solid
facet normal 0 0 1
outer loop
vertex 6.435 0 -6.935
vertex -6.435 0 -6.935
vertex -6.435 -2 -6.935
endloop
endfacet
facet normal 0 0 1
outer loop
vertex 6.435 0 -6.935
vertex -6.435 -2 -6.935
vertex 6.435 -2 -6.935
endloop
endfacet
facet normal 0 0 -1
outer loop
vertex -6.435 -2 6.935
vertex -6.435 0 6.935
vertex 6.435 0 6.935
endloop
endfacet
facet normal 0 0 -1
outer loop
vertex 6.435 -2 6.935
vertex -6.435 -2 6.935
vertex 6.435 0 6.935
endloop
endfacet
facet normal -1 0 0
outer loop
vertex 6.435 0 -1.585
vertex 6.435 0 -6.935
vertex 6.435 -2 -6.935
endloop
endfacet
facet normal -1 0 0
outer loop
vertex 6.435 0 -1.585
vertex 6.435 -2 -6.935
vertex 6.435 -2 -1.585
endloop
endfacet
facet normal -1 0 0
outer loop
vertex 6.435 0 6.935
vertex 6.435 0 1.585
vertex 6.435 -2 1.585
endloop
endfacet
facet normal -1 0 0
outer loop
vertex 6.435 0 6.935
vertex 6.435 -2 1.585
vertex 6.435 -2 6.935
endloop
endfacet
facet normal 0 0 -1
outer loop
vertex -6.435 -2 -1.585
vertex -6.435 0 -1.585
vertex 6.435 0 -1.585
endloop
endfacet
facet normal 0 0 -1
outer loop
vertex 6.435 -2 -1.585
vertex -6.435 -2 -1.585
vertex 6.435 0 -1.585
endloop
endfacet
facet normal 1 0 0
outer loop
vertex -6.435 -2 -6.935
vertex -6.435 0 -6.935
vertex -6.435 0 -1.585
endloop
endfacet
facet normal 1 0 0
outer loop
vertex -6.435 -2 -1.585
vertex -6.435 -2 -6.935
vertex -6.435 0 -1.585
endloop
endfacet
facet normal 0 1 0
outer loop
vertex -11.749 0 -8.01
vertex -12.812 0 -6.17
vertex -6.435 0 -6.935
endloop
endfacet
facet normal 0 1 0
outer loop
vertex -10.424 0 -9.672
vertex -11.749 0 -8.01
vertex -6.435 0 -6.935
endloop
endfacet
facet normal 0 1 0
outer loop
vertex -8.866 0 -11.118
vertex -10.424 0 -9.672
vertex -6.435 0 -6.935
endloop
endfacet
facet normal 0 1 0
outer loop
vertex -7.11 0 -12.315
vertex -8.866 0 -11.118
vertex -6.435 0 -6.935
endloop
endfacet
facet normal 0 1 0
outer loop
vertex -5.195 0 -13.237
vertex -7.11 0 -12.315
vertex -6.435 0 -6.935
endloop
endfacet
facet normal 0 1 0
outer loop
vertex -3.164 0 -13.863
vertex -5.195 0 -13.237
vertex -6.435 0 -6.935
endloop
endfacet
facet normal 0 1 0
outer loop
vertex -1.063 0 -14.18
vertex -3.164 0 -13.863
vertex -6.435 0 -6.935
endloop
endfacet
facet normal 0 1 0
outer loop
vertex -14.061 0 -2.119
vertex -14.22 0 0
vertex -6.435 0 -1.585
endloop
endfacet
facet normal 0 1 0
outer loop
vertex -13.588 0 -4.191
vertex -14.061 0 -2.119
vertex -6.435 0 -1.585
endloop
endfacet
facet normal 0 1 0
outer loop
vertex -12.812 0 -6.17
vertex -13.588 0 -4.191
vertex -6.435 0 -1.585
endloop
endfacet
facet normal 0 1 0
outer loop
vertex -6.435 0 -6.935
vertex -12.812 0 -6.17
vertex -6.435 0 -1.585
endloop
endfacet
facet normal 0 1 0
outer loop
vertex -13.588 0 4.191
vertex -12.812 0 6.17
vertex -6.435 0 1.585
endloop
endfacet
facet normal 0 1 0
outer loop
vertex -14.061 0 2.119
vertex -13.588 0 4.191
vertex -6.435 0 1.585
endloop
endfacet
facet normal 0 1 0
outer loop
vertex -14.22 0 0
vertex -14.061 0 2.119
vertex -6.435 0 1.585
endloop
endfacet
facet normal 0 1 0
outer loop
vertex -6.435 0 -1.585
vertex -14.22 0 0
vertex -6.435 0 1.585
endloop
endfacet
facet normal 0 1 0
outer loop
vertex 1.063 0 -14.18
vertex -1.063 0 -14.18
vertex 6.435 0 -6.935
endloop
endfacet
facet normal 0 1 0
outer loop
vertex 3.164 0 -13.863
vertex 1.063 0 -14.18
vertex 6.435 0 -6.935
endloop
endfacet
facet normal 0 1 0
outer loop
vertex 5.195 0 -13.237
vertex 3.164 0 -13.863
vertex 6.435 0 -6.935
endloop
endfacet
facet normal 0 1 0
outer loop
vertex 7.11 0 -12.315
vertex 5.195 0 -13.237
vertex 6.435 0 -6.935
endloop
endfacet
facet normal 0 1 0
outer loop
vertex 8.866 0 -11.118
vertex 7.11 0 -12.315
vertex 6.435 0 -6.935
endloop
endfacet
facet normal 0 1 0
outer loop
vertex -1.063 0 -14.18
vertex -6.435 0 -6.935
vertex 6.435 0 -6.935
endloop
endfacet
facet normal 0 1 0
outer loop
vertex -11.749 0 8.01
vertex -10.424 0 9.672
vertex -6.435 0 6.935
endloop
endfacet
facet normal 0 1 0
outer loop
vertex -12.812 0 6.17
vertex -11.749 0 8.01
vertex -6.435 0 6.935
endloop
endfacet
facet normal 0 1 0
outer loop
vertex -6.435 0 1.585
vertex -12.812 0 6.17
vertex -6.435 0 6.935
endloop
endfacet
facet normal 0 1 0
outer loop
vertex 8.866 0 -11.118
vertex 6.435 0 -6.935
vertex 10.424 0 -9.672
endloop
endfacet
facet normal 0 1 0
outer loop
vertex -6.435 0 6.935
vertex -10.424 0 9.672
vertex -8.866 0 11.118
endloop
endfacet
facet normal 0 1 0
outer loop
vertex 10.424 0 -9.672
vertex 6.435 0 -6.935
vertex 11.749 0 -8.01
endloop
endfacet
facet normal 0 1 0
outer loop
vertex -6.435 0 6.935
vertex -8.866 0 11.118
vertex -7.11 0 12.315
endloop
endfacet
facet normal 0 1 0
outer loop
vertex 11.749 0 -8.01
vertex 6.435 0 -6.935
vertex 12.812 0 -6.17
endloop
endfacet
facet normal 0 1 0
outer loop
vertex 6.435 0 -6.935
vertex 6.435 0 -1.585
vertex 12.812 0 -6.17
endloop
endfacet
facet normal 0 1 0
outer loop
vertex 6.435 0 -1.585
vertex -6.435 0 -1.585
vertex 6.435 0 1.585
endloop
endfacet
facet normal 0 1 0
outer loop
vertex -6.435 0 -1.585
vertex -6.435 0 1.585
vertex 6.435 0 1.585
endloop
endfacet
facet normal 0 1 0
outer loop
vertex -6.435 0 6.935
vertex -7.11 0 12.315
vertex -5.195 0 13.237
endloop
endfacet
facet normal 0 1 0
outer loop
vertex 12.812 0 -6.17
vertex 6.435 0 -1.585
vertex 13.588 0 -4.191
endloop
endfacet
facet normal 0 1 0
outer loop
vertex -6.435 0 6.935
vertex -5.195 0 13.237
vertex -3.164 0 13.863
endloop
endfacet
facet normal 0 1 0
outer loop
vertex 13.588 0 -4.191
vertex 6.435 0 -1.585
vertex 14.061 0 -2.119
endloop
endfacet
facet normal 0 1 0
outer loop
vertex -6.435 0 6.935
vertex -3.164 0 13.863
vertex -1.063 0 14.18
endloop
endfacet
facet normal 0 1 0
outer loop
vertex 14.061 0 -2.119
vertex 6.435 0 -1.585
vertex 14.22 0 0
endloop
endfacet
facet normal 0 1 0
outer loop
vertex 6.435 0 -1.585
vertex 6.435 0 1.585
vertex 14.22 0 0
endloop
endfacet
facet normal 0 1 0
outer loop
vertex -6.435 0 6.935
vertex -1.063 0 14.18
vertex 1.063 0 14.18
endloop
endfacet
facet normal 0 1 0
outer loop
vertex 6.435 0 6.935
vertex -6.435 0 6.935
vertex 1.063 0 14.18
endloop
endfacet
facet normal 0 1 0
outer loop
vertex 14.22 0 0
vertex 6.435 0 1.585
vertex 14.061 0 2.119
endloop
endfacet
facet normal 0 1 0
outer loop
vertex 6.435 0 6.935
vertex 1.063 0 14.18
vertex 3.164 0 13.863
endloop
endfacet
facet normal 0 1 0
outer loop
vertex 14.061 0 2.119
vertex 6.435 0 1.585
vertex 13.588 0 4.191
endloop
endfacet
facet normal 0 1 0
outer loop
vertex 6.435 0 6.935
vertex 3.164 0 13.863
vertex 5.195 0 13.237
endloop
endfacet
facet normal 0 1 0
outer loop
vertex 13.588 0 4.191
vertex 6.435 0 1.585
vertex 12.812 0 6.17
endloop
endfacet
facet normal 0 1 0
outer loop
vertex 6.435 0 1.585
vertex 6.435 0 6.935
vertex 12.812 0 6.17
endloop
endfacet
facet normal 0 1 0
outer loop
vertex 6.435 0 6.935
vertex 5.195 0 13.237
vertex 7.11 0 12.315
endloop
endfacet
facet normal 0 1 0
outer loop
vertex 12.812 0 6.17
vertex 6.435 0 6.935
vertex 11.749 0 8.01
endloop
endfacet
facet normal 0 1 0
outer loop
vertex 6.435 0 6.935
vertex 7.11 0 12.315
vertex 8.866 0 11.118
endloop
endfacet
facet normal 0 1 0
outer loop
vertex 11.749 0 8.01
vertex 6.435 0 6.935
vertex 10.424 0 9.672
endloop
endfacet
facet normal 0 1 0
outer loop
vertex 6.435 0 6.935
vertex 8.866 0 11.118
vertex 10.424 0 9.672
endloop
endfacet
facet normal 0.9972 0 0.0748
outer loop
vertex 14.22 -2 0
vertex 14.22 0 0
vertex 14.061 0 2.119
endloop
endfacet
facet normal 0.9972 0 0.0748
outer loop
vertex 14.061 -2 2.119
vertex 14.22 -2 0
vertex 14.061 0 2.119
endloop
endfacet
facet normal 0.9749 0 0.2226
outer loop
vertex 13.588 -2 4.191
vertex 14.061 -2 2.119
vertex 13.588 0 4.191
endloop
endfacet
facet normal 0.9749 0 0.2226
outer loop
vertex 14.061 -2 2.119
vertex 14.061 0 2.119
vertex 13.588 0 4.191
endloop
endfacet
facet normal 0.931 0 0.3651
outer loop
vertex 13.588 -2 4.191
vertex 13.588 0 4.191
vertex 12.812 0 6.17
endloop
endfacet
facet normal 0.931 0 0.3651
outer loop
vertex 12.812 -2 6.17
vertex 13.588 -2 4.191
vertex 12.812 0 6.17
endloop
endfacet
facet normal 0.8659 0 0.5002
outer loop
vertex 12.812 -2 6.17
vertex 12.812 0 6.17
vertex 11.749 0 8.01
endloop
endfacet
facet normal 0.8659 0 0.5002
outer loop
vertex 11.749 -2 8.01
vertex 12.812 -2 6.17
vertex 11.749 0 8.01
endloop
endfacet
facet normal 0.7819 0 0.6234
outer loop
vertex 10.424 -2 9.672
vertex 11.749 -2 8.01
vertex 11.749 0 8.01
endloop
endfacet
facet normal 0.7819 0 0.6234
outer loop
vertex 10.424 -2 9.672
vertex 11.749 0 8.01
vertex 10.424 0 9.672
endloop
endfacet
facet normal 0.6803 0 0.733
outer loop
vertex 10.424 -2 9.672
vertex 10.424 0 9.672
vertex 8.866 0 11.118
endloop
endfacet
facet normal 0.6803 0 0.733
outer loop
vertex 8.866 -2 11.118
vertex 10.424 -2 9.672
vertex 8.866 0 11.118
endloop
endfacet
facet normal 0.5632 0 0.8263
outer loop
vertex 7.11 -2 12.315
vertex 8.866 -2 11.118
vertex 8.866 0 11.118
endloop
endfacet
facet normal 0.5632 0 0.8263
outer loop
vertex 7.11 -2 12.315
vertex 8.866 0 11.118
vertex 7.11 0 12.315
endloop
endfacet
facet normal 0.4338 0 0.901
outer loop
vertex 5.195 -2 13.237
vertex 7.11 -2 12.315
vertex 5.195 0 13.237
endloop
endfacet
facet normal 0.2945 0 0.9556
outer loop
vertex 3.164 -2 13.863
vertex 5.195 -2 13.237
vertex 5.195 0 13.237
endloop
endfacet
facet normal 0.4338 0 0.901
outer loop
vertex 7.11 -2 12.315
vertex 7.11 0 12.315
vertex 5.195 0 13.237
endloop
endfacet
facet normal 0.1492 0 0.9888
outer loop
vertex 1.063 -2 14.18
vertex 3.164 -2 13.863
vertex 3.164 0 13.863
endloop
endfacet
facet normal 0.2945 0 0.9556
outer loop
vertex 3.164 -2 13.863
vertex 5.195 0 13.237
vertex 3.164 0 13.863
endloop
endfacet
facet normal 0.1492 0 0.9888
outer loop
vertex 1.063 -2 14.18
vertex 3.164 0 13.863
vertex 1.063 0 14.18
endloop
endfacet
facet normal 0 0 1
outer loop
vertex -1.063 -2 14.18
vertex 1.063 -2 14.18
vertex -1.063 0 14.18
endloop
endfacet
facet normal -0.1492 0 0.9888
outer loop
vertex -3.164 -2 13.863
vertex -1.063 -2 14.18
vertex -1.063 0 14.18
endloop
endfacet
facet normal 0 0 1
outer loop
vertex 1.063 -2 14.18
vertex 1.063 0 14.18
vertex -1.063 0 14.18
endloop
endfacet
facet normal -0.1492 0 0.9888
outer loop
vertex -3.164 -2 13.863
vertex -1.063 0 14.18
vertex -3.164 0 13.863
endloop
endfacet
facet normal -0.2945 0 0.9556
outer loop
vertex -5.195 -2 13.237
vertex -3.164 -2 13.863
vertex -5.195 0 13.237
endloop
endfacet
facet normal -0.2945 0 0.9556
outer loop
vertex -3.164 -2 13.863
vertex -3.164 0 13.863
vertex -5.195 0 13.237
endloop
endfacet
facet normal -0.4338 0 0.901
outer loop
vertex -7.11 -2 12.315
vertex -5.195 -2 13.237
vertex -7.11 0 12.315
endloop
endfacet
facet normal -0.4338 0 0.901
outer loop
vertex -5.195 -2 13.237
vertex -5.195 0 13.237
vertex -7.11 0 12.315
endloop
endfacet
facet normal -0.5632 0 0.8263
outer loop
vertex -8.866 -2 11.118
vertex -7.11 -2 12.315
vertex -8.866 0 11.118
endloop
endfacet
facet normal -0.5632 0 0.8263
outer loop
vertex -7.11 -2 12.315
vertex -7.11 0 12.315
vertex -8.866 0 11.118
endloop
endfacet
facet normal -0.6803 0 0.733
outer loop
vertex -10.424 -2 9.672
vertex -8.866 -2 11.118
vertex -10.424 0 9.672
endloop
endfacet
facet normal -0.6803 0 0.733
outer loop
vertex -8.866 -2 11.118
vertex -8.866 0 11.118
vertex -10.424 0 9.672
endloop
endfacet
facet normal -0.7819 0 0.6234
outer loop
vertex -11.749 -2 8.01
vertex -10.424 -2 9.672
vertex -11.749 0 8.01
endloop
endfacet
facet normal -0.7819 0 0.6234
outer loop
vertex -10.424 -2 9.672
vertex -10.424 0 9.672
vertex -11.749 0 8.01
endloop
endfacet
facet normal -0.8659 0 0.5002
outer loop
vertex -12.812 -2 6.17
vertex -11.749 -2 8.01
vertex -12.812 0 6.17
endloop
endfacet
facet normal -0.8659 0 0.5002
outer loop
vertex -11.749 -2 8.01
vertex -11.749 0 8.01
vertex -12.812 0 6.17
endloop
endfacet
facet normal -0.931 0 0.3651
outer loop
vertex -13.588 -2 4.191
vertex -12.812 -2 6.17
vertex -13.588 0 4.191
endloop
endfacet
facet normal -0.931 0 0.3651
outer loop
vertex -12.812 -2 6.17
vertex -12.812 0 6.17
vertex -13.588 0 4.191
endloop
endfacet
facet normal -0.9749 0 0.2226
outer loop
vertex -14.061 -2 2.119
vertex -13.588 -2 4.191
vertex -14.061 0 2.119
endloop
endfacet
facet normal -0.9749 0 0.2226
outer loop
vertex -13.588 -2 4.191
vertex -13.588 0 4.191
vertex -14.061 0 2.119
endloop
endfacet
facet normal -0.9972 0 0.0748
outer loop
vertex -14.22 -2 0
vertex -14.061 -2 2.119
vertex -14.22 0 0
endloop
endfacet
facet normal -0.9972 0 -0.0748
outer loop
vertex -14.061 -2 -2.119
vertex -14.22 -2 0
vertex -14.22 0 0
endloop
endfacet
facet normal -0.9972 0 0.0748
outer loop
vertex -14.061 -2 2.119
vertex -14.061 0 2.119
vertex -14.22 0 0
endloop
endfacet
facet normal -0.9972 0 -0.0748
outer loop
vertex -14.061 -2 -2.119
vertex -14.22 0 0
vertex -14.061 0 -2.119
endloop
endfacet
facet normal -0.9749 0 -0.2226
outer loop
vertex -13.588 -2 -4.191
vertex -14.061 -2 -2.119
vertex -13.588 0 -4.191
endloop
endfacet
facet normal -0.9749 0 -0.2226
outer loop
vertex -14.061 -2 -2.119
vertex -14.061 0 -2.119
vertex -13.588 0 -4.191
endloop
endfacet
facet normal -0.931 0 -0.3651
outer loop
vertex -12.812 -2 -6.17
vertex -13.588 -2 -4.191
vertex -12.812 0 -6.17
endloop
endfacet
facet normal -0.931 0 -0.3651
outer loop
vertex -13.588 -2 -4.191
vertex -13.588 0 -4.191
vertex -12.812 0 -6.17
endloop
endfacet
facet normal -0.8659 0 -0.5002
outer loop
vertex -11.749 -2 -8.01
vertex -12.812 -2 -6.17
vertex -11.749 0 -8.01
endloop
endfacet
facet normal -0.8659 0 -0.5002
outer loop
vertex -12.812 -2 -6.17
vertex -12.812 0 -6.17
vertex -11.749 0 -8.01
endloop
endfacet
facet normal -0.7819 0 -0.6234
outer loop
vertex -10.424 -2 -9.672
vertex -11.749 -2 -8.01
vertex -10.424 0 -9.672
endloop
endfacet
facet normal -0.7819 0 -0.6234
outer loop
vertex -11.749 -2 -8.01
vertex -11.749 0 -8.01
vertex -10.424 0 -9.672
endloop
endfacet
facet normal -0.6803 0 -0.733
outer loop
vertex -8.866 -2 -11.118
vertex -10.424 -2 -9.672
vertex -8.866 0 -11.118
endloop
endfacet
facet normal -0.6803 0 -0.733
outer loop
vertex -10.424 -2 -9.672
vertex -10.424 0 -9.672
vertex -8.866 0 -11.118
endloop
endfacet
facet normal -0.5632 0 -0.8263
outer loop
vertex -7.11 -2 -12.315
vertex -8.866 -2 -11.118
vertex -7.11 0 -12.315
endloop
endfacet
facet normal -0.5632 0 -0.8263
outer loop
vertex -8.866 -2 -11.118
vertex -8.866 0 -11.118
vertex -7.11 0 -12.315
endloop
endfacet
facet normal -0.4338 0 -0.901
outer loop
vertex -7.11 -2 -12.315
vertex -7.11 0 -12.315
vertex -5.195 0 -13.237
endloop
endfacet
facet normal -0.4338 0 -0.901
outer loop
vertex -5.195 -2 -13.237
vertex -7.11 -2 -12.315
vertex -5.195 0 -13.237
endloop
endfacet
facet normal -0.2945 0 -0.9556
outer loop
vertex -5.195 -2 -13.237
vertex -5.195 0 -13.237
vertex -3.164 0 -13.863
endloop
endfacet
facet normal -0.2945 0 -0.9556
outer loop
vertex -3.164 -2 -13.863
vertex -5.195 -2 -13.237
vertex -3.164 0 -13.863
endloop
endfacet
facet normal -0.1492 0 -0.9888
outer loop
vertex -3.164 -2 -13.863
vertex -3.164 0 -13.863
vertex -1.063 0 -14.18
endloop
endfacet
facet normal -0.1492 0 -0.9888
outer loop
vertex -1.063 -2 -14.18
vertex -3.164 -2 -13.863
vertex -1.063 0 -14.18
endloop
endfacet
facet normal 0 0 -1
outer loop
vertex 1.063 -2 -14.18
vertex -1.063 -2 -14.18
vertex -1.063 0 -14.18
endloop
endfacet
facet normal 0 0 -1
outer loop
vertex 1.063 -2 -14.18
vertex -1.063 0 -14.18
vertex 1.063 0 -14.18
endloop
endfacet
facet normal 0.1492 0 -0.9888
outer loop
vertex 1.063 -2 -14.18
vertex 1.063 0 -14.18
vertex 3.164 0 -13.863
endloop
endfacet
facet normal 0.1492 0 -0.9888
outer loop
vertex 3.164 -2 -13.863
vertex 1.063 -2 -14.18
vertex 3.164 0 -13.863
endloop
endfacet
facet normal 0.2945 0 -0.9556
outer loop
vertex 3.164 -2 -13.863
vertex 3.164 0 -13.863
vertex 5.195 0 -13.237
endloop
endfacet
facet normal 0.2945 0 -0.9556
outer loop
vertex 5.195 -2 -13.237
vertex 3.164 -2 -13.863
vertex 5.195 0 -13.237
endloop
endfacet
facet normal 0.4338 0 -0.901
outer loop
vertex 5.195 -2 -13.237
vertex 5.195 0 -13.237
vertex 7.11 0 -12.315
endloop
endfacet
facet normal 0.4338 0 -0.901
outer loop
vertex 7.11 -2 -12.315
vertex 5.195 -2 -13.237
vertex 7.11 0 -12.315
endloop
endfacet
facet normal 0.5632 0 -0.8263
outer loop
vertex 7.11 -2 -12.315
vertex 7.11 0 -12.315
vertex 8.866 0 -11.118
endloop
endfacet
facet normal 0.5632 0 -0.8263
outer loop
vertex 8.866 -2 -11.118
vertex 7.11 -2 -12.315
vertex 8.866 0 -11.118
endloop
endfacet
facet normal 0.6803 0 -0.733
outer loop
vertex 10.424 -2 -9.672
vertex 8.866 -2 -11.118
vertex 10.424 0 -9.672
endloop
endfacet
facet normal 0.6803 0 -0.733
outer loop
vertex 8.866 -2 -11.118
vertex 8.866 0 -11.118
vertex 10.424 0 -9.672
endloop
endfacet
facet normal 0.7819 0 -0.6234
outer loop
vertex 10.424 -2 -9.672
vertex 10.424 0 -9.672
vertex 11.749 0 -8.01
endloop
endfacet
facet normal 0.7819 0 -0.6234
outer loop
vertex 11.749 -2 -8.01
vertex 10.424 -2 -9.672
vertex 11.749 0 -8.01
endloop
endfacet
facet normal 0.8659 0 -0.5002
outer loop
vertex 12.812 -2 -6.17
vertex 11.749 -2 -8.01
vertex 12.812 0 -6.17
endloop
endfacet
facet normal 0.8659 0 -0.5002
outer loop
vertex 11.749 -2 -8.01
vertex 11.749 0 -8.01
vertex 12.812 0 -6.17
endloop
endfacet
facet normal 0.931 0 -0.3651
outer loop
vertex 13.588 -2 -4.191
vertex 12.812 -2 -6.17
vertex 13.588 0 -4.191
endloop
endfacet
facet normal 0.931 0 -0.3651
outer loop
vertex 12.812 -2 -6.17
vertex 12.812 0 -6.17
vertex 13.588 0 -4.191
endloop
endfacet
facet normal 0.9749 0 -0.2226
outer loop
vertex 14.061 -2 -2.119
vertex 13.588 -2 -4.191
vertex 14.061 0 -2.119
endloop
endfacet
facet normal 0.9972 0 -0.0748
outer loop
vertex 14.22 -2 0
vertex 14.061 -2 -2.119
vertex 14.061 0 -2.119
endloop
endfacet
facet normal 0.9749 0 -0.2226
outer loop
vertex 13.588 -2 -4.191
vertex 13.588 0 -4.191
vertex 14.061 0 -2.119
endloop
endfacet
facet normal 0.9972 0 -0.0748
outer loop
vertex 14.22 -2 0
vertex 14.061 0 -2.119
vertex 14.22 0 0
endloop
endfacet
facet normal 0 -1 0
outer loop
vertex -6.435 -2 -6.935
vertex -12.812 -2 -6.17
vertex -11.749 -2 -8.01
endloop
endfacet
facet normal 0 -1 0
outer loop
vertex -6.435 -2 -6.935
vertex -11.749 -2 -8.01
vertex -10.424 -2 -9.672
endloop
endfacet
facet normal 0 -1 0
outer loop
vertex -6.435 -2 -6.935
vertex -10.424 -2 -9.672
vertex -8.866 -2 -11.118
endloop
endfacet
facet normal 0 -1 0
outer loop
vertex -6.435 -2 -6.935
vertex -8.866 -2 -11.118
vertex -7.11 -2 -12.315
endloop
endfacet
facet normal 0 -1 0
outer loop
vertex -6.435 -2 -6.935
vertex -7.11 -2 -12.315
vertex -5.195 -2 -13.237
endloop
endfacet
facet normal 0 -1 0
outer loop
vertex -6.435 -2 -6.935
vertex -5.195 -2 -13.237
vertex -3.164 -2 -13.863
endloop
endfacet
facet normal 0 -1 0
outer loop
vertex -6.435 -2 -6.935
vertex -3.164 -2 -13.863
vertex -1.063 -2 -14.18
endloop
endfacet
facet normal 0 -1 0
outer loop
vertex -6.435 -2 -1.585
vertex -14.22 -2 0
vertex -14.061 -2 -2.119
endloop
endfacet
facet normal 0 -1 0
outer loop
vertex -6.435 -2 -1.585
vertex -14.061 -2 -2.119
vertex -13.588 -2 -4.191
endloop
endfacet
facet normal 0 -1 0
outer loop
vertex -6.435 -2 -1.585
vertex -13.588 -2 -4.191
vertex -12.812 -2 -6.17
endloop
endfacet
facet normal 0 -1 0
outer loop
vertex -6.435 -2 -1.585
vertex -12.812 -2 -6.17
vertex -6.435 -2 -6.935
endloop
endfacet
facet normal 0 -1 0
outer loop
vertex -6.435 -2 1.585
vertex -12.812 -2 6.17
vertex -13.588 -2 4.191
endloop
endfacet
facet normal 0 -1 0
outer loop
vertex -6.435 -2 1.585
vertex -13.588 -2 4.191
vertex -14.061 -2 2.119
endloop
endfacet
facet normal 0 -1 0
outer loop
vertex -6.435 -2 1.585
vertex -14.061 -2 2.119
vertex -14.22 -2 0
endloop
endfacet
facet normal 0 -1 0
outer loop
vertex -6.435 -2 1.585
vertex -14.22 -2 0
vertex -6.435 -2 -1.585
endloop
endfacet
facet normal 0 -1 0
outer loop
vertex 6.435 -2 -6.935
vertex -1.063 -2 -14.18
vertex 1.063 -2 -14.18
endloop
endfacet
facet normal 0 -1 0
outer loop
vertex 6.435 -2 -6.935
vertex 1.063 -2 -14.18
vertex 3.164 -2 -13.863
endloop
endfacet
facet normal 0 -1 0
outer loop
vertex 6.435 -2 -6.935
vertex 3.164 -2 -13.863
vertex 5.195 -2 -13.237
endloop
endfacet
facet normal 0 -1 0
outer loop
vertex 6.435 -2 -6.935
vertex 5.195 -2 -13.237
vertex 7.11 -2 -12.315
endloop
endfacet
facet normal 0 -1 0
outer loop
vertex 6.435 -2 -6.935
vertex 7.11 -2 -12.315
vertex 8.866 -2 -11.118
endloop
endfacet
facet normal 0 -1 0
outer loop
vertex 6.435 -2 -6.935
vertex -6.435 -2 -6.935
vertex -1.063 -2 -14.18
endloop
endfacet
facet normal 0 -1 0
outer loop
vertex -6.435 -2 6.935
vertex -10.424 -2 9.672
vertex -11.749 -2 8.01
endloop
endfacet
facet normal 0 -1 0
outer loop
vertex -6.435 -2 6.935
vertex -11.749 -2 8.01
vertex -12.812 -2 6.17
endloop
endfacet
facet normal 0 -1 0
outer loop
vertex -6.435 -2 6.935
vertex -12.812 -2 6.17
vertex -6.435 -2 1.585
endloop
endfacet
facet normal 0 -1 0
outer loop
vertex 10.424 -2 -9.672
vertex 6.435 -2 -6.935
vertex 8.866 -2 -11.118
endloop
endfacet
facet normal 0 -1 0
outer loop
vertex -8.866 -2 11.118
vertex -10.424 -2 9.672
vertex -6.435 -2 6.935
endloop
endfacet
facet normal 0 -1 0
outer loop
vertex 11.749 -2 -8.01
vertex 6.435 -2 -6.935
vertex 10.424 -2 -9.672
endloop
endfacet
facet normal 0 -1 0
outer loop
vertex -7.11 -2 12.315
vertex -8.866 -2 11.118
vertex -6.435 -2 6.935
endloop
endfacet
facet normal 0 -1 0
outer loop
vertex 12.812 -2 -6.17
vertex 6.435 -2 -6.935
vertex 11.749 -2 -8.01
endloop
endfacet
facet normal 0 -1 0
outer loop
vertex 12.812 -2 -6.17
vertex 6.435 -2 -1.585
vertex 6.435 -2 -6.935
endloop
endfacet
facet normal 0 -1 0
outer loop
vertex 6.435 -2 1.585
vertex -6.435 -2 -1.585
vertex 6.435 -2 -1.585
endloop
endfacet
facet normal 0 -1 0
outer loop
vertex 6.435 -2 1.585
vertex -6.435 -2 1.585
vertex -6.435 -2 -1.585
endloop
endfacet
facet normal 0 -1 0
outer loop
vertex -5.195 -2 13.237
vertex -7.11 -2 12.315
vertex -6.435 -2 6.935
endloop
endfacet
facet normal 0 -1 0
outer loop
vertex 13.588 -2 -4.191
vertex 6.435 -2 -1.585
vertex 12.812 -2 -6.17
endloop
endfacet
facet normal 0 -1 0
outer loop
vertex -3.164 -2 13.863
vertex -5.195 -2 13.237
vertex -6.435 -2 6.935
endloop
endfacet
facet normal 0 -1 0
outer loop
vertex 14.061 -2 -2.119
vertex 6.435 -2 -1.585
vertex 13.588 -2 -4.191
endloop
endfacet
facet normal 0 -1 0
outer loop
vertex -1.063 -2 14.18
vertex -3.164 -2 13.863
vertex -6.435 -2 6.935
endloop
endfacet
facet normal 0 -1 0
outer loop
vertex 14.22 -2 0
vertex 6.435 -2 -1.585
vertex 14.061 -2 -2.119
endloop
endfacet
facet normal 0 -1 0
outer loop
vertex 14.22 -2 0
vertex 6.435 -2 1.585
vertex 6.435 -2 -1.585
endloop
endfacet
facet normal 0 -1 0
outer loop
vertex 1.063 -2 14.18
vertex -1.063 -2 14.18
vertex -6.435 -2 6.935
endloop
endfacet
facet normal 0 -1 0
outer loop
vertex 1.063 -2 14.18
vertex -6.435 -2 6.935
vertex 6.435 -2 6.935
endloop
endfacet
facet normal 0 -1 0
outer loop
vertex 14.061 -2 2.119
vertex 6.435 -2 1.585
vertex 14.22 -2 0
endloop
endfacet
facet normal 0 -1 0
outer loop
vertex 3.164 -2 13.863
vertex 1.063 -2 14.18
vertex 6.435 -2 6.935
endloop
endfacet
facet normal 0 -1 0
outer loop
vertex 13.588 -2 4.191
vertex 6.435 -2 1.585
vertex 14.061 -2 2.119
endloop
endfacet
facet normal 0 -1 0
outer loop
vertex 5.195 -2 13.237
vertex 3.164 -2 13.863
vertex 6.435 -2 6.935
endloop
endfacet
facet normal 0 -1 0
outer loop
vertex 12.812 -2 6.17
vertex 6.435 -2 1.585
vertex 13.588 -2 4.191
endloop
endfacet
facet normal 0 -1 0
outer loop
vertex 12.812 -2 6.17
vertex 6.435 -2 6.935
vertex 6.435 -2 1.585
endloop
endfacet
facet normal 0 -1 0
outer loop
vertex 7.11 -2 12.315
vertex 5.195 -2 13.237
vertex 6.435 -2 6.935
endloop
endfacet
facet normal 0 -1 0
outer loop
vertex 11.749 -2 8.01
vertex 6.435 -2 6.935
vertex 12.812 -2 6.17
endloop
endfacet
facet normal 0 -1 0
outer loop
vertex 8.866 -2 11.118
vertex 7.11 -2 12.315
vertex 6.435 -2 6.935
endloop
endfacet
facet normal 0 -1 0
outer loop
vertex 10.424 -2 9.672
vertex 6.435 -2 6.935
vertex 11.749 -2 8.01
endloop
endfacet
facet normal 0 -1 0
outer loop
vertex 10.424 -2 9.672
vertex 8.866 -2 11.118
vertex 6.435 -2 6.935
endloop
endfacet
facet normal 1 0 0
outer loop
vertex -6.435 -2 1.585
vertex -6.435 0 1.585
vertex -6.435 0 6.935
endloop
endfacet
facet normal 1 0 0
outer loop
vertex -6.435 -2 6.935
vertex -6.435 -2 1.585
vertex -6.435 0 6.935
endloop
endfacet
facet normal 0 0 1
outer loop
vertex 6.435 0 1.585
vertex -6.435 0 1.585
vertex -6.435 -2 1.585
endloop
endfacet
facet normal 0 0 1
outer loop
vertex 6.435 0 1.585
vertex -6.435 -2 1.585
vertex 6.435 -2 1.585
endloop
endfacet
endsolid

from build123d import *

# Parameters (mm, degrees)
F0_R     = 14.22
F0_W     = 12.87
F0_H     = 5.35
F1_DEPTH = 2


with BuildPart() as f1:
    # F0 (on Front) → F1 (new body)
    with BuildSketch(Plane.XZ):
        Circle(F0_R)
        with Locations((0, -4.26)):
            Rectangle(F0_W, F0_H, mode=Mode.SUBTRACT)
        with Locations((0, 4.26)):
            Rectangle(F0_W, F0_H, mode=Mode.SUBTRACT)
    extrude(amount=F1_DEPTH)


solid = f1.part
